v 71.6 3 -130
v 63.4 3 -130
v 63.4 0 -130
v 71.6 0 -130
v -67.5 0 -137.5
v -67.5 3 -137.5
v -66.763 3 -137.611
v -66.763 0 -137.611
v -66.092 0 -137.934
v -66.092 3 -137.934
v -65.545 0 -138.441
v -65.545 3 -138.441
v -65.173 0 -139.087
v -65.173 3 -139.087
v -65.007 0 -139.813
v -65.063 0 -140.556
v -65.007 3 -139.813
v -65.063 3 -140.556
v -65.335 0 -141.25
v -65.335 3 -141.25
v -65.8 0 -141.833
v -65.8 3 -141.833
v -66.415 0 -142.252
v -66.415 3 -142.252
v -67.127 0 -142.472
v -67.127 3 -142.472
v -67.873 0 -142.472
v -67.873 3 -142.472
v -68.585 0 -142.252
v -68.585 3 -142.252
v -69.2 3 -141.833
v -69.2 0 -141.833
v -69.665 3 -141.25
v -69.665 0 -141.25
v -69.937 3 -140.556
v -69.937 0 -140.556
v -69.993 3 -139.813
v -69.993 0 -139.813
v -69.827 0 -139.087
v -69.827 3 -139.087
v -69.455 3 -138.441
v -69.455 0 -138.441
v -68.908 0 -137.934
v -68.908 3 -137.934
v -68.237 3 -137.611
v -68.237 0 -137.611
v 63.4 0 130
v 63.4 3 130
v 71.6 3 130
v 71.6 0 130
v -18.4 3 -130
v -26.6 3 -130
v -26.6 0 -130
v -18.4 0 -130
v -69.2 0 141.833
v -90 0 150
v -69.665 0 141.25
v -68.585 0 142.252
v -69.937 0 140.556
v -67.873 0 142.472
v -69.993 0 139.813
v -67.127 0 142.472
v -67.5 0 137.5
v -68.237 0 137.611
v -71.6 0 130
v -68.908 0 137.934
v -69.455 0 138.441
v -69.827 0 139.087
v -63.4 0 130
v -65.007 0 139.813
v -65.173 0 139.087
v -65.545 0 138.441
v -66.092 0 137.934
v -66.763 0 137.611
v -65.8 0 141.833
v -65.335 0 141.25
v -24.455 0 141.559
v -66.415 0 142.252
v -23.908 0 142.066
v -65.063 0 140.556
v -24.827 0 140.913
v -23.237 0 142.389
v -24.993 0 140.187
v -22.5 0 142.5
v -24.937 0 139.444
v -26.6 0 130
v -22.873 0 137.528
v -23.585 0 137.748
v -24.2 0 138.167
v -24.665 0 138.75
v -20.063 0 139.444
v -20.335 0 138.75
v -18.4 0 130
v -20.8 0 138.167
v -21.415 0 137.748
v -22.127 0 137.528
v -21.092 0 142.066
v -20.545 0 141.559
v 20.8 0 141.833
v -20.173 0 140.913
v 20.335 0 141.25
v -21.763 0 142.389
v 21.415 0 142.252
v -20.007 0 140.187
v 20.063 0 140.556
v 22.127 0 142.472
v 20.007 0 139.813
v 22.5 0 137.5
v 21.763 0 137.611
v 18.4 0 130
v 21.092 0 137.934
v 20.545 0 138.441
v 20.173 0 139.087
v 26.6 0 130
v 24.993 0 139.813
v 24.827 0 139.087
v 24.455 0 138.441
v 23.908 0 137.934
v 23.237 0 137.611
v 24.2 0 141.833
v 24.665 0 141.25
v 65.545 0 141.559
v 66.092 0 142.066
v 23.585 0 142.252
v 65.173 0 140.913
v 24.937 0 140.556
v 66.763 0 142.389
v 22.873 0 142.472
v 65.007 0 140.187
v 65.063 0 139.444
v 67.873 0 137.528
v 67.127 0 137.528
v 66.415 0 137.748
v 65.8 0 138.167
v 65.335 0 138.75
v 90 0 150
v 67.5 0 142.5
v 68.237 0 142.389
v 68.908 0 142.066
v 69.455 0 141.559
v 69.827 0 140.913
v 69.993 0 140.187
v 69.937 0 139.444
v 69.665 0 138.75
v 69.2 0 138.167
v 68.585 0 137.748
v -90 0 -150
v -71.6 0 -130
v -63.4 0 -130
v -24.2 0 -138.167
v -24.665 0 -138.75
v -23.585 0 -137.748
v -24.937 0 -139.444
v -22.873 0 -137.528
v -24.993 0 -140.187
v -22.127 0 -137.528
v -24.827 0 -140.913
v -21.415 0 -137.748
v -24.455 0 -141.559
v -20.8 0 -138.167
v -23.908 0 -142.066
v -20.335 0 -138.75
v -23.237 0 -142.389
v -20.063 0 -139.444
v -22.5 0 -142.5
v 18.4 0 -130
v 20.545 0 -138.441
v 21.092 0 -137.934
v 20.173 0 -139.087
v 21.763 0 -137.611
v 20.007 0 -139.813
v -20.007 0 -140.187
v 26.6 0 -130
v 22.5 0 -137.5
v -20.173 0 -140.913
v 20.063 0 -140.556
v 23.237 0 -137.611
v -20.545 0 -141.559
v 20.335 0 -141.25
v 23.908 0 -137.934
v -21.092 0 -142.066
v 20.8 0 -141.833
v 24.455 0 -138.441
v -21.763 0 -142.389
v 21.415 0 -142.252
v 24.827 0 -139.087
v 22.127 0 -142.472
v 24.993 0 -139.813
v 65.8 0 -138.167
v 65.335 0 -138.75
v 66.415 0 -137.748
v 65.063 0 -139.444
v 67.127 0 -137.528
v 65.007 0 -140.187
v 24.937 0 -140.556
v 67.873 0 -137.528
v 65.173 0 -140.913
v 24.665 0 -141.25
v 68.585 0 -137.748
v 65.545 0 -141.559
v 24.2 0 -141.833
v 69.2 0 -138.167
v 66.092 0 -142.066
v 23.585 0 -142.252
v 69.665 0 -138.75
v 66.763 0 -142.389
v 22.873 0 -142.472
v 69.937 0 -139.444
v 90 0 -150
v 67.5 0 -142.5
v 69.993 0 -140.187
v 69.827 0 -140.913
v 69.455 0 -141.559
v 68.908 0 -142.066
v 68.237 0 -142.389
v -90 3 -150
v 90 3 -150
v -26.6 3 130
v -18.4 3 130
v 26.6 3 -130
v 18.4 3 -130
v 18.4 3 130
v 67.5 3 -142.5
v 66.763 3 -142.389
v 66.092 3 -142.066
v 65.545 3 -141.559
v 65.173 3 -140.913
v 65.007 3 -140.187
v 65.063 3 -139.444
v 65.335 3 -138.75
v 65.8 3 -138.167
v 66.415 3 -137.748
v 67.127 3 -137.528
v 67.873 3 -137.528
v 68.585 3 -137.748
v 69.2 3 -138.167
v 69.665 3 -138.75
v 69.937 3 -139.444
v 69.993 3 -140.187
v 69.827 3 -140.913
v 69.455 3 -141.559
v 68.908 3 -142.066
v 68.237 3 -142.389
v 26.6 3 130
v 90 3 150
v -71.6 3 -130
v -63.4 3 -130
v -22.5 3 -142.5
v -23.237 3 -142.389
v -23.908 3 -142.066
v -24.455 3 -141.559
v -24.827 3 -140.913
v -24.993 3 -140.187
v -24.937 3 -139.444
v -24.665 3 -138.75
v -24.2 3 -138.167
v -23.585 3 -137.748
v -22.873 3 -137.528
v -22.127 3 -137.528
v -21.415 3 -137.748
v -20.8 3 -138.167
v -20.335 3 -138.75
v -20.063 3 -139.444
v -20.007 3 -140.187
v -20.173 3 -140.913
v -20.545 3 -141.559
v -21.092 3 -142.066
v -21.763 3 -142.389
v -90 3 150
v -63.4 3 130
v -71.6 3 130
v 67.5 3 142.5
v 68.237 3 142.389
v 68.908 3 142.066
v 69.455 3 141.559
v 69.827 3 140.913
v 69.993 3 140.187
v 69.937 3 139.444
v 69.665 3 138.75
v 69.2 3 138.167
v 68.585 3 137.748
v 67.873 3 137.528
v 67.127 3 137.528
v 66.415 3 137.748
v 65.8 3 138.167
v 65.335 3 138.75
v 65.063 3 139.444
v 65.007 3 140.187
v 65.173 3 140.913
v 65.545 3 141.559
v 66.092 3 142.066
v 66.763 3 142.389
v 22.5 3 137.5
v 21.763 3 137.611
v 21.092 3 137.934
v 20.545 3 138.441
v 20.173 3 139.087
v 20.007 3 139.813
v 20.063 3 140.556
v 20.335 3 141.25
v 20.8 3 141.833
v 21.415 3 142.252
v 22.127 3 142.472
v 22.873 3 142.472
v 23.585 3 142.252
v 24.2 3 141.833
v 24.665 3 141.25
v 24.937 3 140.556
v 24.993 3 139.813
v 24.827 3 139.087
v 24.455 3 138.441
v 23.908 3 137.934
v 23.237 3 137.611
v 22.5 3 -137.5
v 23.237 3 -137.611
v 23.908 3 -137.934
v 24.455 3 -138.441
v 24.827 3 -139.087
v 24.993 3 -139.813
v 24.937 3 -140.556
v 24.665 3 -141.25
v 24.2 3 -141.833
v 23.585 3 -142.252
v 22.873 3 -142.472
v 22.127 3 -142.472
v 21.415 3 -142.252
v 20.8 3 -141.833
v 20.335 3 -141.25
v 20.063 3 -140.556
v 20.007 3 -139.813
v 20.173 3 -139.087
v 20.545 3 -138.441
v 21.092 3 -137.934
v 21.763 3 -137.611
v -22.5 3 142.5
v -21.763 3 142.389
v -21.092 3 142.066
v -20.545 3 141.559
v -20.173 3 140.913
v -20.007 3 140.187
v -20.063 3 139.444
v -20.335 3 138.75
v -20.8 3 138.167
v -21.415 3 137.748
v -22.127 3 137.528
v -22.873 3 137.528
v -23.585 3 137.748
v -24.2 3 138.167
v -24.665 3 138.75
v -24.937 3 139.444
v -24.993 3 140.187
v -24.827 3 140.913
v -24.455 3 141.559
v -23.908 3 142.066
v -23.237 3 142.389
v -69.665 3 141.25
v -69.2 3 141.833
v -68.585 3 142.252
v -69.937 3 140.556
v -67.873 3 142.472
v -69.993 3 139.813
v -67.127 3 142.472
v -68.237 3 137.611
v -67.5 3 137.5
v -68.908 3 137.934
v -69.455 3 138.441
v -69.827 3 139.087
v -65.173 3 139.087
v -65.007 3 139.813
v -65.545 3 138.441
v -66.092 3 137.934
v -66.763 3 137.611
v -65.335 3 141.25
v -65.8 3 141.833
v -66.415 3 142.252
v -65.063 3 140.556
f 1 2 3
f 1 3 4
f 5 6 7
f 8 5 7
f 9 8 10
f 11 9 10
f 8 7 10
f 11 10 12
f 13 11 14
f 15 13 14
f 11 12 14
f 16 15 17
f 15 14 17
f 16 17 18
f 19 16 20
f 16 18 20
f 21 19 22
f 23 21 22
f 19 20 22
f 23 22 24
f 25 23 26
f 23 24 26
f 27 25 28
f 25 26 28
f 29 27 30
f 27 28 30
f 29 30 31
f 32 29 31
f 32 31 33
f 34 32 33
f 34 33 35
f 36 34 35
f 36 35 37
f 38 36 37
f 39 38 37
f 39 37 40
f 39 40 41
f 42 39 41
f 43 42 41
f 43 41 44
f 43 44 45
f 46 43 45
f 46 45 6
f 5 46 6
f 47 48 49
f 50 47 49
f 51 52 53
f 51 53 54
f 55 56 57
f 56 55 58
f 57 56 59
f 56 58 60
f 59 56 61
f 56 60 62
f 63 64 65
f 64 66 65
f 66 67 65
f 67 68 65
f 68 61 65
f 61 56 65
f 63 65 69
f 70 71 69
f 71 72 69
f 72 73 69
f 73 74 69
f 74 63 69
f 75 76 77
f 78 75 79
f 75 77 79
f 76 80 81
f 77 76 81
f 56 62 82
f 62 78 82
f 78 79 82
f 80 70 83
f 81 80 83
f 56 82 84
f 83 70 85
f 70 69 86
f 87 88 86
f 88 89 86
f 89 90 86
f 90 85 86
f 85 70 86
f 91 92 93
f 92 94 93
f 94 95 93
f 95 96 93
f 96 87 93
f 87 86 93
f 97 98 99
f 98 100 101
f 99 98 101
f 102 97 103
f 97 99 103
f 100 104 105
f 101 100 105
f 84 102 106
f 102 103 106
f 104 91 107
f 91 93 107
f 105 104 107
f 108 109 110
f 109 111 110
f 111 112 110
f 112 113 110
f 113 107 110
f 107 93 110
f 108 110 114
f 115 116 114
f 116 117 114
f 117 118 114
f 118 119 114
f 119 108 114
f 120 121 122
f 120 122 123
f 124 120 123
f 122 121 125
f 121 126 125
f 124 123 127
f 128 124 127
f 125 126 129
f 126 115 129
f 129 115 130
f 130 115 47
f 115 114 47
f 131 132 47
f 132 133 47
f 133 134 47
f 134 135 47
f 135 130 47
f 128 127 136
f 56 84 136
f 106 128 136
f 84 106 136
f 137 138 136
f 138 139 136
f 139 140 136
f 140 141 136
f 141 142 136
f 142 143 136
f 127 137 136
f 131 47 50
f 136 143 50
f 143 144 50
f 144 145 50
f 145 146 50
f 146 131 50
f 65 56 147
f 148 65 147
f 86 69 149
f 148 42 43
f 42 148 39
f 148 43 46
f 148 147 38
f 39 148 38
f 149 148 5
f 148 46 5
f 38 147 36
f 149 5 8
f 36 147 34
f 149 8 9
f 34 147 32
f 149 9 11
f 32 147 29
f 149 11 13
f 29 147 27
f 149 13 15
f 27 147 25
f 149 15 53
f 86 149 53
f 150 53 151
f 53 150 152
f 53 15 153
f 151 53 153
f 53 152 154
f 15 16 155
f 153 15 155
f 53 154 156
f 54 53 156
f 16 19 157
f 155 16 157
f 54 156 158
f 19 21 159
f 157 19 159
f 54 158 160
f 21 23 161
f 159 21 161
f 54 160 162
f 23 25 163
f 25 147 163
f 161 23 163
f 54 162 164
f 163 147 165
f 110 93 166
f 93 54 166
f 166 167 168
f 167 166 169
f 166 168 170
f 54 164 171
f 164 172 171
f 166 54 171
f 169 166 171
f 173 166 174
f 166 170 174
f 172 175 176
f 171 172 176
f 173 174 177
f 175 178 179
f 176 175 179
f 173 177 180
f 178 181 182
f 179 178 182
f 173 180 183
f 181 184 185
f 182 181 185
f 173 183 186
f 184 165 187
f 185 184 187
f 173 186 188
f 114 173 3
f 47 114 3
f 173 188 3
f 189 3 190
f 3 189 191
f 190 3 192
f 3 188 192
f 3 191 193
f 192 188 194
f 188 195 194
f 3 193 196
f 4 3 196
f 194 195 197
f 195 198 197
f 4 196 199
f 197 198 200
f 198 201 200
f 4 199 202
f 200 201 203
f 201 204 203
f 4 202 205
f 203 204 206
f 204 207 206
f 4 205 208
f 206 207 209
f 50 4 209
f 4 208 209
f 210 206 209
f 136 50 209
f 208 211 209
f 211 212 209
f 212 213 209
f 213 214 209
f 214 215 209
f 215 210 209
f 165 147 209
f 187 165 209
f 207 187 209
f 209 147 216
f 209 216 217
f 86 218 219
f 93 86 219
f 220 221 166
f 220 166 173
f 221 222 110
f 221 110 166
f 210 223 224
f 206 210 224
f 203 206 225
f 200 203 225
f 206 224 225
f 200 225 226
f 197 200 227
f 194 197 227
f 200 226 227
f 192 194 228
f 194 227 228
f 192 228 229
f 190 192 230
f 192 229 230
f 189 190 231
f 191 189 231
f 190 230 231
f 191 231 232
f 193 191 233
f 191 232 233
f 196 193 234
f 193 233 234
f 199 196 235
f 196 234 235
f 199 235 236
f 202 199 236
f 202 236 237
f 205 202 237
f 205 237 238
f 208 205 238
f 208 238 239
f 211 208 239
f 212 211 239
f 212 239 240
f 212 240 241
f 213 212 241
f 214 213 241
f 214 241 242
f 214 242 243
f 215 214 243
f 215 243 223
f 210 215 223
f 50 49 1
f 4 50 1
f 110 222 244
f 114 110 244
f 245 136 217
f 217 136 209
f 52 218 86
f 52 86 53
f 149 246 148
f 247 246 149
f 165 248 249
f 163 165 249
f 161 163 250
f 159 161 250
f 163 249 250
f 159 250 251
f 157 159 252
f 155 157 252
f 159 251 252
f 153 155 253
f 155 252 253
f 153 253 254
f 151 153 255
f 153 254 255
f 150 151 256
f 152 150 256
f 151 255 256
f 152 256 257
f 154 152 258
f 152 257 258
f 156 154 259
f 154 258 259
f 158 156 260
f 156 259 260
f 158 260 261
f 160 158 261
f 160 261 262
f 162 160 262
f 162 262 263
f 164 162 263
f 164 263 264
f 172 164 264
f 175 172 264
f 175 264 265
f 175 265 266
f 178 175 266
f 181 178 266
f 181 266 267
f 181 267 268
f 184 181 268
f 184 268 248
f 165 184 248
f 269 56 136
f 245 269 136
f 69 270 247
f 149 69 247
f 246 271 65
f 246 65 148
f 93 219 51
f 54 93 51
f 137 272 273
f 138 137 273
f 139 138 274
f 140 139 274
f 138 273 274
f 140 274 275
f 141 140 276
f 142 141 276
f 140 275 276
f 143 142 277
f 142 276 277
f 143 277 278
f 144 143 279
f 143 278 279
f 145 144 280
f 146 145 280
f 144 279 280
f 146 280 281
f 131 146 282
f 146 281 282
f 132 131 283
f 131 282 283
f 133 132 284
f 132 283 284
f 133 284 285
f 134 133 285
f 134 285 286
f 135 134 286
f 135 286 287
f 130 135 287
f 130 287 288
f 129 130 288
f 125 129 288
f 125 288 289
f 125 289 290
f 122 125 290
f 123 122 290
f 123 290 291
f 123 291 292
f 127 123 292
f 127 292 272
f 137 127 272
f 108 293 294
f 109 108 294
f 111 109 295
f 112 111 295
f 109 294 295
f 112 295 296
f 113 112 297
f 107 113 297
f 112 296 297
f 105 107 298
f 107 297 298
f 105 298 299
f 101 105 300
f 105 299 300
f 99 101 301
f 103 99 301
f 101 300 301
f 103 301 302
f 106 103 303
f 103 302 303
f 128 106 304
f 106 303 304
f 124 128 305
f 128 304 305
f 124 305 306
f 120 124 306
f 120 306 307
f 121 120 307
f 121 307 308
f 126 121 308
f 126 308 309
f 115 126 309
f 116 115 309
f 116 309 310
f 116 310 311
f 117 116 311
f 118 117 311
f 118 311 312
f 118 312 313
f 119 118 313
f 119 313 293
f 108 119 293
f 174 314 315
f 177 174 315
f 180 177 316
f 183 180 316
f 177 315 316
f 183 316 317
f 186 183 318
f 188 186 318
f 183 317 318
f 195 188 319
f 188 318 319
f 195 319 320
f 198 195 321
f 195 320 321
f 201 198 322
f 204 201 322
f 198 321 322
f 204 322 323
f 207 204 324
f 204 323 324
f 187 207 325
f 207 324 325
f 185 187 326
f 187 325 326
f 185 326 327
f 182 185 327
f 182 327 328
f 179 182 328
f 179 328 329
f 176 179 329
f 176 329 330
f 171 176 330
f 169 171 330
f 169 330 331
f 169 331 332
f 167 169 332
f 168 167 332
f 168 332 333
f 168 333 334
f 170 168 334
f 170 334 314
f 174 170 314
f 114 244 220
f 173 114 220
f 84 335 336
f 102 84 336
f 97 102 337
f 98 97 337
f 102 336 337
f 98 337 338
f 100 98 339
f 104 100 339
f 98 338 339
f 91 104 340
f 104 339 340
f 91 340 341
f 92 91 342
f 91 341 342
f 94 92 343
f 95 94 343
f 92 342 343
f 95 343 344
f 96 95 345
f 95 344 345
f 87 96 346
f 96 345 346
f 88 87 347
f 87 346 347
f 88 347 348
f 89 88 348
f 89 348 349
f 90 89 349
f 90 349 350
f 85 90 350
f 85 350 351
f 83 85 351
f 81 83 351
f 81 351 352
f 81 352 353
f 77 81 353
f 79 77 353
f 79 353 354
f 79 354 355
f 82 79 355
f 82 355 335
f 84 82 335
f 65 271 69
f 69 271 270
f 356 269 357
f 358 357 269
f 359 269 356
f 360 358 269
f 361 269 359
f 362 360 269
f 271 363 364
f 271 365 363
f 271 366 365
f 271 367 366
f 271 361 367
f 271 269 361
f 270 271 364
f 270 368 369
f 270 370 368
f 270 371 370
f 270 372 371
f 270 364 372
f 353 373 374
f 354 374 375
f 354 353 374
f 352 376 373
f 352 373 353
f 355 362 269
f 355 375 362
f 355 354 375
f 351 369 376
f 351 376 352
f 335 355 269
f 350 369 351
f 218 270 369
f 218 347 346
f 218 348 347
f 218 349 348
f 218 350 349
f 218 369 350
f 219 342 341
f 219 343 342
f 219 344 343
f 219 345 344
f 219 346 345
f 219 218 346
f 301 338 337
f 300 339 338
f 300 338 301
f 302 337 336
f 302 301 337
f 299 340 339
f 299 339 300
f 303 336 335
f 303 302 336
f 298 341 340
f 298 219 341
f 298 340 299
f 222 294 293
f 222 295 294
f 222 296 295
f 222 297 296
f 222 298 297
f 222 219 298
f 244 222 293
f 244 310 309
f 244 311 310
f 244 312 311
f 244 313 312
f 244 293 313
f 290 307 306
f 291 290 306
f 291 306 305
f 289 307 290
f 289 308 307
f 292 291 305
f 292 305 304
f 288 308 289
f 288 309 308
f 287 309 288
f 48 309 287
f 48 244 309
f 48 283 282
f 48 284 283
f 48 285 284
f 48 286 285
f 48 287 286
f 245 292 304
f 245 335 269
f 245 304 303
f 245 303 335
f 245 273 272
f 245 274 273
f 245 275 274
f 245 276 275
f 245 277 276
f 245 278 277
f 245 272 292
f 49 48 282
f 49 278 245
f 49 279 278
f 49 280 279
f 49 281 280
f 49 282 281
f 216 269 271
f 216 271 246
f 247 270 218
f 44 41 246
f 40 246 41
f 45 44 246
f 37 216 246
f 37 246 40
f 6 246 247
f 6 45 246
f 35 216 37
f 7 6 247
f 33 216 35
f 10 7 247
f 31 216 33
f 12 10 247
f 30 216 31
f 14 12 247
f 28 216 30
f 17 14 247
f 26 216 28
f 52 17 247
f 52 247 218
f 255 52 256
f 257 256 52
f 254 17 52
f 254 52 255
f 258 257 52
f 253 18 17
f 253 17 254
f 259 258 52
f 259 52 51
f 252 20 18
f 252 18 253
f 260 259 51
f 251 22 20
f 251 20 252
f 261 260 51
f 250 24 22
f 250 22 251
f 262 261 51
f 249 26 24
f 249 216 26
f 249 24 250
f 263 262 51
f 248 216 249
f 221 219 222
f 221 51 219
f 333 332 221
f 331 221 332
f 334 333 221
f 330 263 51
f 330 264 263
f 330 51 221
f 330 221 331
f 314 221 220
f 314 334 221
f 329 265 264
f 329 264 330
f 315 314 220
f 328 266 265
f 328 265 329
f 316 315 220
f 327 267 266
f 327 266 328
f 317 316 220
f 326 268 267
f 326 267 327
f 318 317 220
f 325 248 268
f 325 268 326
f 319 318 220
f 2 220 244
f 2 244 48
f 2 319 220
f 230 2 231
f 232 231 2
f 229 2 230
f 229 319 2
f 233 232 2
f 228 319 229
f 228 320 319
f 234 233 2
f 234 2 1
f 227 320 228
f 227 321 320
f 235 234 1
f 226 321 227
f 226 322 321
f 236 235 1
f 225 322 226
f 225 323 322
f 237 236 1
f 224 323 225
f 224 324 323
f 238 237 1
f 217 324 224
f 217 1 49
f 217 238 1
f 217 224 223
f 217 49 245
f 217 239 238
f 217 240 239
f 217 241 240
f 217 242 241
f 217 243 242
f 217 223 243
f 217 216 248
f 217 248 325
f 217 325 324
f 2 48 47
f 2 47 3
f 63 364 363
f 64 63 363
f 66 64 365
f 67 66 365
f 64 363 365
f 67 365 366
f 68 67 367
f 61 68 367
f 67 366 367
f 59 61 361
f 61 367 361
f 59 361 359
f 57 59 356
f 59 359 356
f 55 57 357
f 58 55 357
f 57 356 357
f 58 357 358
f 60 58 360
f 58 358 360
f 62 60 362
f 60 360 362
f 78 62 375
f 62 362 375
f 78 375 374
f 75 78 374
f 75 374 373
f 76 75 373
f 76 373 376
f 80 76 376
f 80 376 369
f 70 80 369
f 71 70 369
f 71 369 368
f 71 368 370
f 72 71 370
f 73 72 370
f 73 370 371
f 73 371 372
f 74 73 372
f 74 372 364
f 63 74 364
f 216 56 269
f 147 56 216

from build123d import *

# Parameters (mm, degrees)
SKETCH2_W           = 180
SKETCH2_H           = 300
BOSS_EXTRUDE1_DEPTH = 3
SKETCH3_W           = 8.2
SKETCH3_H           = 260
CUT_EXTRUDE1_DEPTH  = 175.954279742
SKETCH4_R           = 2.5
CUT_EXTRUDE2_DEPTH  = 175.954279742


with BuildPart() as part:
    # Sketch2 → Boss-Extrude1 (new body)
    with BuildSketch(Plane(origin=(0, 0, 0), x_dir=(1, 0, 0), z_dir=(0, 1, 0))):
        Rectangle(SKETCH2_W, SKETCH2_H)
    extrude(amount=BOSS_EXTRUDE1_DEPTH)

    # Sketch3 → Cut-Extrude1 (cut, through all)
    with BuildSketch(Plane(origin=(0, 3, 0), x_dir=(1, 0, 0), z_dir=(0, 1, 0))):
        with Locations((-67.5, 0)):
            Rectangle(SKETCH3_W, SKETCH3_H)
        with Locations((-22.5, 0)):
            Rectangle(SKETCH3_W, SKETCH3_H)
        with Locations((22.5, 0)):
            Rectangle(SKETCH3_W, SKETCH3_H)
        with Locations((67.5, 0)):
            Rectangle(SKETCH3_W, SKETCH3_H)
    extrude(amount=-CUT_EXTRUDE1_DEPTH, mode=Mode.SUBTRACT)

    # Sketch4 → Cut-Extrude2 (cut, through all)
    with BuildSketch(Plane(origin=(0, 3, 0), x_dir=(1, 0, 0), z_dir=(0, 1, 0))):
        with Locations(Location((67.5, -140, 0), (0, 0, 270))):
            Circle(SKETCH4_R)
        with Locations(Location((-67.5, -140, 0), (0, 0, 90))):
            Circle(SKETCH4_R)
        with Locations(Location((67.5, 140, 0), (0, 0, 90))):
            Circle(SKETCH4_R)
        with Locations(Location((-67.5, 140, 0), (0, 0, 270))):
            Circle(SKETCH4_R)
        with Locations(Location((-22.5, -140, 0), (0, 0, 270))):
            Circle(SKETCH4_R)
        with Locations(Location((22.5, -140, 0), (0, 0, 90))):
            Circle(SKETCH4_R)
        with Locations(Location((22.5, 140, 0), (0, 0, 270))):
            Circle(SKETCH4_R)
        with Locations(Location((-22.5, 140, 0), (0, 0, 90))):
            Circle(SKETCH4_R)
    extrude(amount=-CUT_EXTRUDE2_DEPTH, mode=Mode.SUBTRACT)


solid = part.part
